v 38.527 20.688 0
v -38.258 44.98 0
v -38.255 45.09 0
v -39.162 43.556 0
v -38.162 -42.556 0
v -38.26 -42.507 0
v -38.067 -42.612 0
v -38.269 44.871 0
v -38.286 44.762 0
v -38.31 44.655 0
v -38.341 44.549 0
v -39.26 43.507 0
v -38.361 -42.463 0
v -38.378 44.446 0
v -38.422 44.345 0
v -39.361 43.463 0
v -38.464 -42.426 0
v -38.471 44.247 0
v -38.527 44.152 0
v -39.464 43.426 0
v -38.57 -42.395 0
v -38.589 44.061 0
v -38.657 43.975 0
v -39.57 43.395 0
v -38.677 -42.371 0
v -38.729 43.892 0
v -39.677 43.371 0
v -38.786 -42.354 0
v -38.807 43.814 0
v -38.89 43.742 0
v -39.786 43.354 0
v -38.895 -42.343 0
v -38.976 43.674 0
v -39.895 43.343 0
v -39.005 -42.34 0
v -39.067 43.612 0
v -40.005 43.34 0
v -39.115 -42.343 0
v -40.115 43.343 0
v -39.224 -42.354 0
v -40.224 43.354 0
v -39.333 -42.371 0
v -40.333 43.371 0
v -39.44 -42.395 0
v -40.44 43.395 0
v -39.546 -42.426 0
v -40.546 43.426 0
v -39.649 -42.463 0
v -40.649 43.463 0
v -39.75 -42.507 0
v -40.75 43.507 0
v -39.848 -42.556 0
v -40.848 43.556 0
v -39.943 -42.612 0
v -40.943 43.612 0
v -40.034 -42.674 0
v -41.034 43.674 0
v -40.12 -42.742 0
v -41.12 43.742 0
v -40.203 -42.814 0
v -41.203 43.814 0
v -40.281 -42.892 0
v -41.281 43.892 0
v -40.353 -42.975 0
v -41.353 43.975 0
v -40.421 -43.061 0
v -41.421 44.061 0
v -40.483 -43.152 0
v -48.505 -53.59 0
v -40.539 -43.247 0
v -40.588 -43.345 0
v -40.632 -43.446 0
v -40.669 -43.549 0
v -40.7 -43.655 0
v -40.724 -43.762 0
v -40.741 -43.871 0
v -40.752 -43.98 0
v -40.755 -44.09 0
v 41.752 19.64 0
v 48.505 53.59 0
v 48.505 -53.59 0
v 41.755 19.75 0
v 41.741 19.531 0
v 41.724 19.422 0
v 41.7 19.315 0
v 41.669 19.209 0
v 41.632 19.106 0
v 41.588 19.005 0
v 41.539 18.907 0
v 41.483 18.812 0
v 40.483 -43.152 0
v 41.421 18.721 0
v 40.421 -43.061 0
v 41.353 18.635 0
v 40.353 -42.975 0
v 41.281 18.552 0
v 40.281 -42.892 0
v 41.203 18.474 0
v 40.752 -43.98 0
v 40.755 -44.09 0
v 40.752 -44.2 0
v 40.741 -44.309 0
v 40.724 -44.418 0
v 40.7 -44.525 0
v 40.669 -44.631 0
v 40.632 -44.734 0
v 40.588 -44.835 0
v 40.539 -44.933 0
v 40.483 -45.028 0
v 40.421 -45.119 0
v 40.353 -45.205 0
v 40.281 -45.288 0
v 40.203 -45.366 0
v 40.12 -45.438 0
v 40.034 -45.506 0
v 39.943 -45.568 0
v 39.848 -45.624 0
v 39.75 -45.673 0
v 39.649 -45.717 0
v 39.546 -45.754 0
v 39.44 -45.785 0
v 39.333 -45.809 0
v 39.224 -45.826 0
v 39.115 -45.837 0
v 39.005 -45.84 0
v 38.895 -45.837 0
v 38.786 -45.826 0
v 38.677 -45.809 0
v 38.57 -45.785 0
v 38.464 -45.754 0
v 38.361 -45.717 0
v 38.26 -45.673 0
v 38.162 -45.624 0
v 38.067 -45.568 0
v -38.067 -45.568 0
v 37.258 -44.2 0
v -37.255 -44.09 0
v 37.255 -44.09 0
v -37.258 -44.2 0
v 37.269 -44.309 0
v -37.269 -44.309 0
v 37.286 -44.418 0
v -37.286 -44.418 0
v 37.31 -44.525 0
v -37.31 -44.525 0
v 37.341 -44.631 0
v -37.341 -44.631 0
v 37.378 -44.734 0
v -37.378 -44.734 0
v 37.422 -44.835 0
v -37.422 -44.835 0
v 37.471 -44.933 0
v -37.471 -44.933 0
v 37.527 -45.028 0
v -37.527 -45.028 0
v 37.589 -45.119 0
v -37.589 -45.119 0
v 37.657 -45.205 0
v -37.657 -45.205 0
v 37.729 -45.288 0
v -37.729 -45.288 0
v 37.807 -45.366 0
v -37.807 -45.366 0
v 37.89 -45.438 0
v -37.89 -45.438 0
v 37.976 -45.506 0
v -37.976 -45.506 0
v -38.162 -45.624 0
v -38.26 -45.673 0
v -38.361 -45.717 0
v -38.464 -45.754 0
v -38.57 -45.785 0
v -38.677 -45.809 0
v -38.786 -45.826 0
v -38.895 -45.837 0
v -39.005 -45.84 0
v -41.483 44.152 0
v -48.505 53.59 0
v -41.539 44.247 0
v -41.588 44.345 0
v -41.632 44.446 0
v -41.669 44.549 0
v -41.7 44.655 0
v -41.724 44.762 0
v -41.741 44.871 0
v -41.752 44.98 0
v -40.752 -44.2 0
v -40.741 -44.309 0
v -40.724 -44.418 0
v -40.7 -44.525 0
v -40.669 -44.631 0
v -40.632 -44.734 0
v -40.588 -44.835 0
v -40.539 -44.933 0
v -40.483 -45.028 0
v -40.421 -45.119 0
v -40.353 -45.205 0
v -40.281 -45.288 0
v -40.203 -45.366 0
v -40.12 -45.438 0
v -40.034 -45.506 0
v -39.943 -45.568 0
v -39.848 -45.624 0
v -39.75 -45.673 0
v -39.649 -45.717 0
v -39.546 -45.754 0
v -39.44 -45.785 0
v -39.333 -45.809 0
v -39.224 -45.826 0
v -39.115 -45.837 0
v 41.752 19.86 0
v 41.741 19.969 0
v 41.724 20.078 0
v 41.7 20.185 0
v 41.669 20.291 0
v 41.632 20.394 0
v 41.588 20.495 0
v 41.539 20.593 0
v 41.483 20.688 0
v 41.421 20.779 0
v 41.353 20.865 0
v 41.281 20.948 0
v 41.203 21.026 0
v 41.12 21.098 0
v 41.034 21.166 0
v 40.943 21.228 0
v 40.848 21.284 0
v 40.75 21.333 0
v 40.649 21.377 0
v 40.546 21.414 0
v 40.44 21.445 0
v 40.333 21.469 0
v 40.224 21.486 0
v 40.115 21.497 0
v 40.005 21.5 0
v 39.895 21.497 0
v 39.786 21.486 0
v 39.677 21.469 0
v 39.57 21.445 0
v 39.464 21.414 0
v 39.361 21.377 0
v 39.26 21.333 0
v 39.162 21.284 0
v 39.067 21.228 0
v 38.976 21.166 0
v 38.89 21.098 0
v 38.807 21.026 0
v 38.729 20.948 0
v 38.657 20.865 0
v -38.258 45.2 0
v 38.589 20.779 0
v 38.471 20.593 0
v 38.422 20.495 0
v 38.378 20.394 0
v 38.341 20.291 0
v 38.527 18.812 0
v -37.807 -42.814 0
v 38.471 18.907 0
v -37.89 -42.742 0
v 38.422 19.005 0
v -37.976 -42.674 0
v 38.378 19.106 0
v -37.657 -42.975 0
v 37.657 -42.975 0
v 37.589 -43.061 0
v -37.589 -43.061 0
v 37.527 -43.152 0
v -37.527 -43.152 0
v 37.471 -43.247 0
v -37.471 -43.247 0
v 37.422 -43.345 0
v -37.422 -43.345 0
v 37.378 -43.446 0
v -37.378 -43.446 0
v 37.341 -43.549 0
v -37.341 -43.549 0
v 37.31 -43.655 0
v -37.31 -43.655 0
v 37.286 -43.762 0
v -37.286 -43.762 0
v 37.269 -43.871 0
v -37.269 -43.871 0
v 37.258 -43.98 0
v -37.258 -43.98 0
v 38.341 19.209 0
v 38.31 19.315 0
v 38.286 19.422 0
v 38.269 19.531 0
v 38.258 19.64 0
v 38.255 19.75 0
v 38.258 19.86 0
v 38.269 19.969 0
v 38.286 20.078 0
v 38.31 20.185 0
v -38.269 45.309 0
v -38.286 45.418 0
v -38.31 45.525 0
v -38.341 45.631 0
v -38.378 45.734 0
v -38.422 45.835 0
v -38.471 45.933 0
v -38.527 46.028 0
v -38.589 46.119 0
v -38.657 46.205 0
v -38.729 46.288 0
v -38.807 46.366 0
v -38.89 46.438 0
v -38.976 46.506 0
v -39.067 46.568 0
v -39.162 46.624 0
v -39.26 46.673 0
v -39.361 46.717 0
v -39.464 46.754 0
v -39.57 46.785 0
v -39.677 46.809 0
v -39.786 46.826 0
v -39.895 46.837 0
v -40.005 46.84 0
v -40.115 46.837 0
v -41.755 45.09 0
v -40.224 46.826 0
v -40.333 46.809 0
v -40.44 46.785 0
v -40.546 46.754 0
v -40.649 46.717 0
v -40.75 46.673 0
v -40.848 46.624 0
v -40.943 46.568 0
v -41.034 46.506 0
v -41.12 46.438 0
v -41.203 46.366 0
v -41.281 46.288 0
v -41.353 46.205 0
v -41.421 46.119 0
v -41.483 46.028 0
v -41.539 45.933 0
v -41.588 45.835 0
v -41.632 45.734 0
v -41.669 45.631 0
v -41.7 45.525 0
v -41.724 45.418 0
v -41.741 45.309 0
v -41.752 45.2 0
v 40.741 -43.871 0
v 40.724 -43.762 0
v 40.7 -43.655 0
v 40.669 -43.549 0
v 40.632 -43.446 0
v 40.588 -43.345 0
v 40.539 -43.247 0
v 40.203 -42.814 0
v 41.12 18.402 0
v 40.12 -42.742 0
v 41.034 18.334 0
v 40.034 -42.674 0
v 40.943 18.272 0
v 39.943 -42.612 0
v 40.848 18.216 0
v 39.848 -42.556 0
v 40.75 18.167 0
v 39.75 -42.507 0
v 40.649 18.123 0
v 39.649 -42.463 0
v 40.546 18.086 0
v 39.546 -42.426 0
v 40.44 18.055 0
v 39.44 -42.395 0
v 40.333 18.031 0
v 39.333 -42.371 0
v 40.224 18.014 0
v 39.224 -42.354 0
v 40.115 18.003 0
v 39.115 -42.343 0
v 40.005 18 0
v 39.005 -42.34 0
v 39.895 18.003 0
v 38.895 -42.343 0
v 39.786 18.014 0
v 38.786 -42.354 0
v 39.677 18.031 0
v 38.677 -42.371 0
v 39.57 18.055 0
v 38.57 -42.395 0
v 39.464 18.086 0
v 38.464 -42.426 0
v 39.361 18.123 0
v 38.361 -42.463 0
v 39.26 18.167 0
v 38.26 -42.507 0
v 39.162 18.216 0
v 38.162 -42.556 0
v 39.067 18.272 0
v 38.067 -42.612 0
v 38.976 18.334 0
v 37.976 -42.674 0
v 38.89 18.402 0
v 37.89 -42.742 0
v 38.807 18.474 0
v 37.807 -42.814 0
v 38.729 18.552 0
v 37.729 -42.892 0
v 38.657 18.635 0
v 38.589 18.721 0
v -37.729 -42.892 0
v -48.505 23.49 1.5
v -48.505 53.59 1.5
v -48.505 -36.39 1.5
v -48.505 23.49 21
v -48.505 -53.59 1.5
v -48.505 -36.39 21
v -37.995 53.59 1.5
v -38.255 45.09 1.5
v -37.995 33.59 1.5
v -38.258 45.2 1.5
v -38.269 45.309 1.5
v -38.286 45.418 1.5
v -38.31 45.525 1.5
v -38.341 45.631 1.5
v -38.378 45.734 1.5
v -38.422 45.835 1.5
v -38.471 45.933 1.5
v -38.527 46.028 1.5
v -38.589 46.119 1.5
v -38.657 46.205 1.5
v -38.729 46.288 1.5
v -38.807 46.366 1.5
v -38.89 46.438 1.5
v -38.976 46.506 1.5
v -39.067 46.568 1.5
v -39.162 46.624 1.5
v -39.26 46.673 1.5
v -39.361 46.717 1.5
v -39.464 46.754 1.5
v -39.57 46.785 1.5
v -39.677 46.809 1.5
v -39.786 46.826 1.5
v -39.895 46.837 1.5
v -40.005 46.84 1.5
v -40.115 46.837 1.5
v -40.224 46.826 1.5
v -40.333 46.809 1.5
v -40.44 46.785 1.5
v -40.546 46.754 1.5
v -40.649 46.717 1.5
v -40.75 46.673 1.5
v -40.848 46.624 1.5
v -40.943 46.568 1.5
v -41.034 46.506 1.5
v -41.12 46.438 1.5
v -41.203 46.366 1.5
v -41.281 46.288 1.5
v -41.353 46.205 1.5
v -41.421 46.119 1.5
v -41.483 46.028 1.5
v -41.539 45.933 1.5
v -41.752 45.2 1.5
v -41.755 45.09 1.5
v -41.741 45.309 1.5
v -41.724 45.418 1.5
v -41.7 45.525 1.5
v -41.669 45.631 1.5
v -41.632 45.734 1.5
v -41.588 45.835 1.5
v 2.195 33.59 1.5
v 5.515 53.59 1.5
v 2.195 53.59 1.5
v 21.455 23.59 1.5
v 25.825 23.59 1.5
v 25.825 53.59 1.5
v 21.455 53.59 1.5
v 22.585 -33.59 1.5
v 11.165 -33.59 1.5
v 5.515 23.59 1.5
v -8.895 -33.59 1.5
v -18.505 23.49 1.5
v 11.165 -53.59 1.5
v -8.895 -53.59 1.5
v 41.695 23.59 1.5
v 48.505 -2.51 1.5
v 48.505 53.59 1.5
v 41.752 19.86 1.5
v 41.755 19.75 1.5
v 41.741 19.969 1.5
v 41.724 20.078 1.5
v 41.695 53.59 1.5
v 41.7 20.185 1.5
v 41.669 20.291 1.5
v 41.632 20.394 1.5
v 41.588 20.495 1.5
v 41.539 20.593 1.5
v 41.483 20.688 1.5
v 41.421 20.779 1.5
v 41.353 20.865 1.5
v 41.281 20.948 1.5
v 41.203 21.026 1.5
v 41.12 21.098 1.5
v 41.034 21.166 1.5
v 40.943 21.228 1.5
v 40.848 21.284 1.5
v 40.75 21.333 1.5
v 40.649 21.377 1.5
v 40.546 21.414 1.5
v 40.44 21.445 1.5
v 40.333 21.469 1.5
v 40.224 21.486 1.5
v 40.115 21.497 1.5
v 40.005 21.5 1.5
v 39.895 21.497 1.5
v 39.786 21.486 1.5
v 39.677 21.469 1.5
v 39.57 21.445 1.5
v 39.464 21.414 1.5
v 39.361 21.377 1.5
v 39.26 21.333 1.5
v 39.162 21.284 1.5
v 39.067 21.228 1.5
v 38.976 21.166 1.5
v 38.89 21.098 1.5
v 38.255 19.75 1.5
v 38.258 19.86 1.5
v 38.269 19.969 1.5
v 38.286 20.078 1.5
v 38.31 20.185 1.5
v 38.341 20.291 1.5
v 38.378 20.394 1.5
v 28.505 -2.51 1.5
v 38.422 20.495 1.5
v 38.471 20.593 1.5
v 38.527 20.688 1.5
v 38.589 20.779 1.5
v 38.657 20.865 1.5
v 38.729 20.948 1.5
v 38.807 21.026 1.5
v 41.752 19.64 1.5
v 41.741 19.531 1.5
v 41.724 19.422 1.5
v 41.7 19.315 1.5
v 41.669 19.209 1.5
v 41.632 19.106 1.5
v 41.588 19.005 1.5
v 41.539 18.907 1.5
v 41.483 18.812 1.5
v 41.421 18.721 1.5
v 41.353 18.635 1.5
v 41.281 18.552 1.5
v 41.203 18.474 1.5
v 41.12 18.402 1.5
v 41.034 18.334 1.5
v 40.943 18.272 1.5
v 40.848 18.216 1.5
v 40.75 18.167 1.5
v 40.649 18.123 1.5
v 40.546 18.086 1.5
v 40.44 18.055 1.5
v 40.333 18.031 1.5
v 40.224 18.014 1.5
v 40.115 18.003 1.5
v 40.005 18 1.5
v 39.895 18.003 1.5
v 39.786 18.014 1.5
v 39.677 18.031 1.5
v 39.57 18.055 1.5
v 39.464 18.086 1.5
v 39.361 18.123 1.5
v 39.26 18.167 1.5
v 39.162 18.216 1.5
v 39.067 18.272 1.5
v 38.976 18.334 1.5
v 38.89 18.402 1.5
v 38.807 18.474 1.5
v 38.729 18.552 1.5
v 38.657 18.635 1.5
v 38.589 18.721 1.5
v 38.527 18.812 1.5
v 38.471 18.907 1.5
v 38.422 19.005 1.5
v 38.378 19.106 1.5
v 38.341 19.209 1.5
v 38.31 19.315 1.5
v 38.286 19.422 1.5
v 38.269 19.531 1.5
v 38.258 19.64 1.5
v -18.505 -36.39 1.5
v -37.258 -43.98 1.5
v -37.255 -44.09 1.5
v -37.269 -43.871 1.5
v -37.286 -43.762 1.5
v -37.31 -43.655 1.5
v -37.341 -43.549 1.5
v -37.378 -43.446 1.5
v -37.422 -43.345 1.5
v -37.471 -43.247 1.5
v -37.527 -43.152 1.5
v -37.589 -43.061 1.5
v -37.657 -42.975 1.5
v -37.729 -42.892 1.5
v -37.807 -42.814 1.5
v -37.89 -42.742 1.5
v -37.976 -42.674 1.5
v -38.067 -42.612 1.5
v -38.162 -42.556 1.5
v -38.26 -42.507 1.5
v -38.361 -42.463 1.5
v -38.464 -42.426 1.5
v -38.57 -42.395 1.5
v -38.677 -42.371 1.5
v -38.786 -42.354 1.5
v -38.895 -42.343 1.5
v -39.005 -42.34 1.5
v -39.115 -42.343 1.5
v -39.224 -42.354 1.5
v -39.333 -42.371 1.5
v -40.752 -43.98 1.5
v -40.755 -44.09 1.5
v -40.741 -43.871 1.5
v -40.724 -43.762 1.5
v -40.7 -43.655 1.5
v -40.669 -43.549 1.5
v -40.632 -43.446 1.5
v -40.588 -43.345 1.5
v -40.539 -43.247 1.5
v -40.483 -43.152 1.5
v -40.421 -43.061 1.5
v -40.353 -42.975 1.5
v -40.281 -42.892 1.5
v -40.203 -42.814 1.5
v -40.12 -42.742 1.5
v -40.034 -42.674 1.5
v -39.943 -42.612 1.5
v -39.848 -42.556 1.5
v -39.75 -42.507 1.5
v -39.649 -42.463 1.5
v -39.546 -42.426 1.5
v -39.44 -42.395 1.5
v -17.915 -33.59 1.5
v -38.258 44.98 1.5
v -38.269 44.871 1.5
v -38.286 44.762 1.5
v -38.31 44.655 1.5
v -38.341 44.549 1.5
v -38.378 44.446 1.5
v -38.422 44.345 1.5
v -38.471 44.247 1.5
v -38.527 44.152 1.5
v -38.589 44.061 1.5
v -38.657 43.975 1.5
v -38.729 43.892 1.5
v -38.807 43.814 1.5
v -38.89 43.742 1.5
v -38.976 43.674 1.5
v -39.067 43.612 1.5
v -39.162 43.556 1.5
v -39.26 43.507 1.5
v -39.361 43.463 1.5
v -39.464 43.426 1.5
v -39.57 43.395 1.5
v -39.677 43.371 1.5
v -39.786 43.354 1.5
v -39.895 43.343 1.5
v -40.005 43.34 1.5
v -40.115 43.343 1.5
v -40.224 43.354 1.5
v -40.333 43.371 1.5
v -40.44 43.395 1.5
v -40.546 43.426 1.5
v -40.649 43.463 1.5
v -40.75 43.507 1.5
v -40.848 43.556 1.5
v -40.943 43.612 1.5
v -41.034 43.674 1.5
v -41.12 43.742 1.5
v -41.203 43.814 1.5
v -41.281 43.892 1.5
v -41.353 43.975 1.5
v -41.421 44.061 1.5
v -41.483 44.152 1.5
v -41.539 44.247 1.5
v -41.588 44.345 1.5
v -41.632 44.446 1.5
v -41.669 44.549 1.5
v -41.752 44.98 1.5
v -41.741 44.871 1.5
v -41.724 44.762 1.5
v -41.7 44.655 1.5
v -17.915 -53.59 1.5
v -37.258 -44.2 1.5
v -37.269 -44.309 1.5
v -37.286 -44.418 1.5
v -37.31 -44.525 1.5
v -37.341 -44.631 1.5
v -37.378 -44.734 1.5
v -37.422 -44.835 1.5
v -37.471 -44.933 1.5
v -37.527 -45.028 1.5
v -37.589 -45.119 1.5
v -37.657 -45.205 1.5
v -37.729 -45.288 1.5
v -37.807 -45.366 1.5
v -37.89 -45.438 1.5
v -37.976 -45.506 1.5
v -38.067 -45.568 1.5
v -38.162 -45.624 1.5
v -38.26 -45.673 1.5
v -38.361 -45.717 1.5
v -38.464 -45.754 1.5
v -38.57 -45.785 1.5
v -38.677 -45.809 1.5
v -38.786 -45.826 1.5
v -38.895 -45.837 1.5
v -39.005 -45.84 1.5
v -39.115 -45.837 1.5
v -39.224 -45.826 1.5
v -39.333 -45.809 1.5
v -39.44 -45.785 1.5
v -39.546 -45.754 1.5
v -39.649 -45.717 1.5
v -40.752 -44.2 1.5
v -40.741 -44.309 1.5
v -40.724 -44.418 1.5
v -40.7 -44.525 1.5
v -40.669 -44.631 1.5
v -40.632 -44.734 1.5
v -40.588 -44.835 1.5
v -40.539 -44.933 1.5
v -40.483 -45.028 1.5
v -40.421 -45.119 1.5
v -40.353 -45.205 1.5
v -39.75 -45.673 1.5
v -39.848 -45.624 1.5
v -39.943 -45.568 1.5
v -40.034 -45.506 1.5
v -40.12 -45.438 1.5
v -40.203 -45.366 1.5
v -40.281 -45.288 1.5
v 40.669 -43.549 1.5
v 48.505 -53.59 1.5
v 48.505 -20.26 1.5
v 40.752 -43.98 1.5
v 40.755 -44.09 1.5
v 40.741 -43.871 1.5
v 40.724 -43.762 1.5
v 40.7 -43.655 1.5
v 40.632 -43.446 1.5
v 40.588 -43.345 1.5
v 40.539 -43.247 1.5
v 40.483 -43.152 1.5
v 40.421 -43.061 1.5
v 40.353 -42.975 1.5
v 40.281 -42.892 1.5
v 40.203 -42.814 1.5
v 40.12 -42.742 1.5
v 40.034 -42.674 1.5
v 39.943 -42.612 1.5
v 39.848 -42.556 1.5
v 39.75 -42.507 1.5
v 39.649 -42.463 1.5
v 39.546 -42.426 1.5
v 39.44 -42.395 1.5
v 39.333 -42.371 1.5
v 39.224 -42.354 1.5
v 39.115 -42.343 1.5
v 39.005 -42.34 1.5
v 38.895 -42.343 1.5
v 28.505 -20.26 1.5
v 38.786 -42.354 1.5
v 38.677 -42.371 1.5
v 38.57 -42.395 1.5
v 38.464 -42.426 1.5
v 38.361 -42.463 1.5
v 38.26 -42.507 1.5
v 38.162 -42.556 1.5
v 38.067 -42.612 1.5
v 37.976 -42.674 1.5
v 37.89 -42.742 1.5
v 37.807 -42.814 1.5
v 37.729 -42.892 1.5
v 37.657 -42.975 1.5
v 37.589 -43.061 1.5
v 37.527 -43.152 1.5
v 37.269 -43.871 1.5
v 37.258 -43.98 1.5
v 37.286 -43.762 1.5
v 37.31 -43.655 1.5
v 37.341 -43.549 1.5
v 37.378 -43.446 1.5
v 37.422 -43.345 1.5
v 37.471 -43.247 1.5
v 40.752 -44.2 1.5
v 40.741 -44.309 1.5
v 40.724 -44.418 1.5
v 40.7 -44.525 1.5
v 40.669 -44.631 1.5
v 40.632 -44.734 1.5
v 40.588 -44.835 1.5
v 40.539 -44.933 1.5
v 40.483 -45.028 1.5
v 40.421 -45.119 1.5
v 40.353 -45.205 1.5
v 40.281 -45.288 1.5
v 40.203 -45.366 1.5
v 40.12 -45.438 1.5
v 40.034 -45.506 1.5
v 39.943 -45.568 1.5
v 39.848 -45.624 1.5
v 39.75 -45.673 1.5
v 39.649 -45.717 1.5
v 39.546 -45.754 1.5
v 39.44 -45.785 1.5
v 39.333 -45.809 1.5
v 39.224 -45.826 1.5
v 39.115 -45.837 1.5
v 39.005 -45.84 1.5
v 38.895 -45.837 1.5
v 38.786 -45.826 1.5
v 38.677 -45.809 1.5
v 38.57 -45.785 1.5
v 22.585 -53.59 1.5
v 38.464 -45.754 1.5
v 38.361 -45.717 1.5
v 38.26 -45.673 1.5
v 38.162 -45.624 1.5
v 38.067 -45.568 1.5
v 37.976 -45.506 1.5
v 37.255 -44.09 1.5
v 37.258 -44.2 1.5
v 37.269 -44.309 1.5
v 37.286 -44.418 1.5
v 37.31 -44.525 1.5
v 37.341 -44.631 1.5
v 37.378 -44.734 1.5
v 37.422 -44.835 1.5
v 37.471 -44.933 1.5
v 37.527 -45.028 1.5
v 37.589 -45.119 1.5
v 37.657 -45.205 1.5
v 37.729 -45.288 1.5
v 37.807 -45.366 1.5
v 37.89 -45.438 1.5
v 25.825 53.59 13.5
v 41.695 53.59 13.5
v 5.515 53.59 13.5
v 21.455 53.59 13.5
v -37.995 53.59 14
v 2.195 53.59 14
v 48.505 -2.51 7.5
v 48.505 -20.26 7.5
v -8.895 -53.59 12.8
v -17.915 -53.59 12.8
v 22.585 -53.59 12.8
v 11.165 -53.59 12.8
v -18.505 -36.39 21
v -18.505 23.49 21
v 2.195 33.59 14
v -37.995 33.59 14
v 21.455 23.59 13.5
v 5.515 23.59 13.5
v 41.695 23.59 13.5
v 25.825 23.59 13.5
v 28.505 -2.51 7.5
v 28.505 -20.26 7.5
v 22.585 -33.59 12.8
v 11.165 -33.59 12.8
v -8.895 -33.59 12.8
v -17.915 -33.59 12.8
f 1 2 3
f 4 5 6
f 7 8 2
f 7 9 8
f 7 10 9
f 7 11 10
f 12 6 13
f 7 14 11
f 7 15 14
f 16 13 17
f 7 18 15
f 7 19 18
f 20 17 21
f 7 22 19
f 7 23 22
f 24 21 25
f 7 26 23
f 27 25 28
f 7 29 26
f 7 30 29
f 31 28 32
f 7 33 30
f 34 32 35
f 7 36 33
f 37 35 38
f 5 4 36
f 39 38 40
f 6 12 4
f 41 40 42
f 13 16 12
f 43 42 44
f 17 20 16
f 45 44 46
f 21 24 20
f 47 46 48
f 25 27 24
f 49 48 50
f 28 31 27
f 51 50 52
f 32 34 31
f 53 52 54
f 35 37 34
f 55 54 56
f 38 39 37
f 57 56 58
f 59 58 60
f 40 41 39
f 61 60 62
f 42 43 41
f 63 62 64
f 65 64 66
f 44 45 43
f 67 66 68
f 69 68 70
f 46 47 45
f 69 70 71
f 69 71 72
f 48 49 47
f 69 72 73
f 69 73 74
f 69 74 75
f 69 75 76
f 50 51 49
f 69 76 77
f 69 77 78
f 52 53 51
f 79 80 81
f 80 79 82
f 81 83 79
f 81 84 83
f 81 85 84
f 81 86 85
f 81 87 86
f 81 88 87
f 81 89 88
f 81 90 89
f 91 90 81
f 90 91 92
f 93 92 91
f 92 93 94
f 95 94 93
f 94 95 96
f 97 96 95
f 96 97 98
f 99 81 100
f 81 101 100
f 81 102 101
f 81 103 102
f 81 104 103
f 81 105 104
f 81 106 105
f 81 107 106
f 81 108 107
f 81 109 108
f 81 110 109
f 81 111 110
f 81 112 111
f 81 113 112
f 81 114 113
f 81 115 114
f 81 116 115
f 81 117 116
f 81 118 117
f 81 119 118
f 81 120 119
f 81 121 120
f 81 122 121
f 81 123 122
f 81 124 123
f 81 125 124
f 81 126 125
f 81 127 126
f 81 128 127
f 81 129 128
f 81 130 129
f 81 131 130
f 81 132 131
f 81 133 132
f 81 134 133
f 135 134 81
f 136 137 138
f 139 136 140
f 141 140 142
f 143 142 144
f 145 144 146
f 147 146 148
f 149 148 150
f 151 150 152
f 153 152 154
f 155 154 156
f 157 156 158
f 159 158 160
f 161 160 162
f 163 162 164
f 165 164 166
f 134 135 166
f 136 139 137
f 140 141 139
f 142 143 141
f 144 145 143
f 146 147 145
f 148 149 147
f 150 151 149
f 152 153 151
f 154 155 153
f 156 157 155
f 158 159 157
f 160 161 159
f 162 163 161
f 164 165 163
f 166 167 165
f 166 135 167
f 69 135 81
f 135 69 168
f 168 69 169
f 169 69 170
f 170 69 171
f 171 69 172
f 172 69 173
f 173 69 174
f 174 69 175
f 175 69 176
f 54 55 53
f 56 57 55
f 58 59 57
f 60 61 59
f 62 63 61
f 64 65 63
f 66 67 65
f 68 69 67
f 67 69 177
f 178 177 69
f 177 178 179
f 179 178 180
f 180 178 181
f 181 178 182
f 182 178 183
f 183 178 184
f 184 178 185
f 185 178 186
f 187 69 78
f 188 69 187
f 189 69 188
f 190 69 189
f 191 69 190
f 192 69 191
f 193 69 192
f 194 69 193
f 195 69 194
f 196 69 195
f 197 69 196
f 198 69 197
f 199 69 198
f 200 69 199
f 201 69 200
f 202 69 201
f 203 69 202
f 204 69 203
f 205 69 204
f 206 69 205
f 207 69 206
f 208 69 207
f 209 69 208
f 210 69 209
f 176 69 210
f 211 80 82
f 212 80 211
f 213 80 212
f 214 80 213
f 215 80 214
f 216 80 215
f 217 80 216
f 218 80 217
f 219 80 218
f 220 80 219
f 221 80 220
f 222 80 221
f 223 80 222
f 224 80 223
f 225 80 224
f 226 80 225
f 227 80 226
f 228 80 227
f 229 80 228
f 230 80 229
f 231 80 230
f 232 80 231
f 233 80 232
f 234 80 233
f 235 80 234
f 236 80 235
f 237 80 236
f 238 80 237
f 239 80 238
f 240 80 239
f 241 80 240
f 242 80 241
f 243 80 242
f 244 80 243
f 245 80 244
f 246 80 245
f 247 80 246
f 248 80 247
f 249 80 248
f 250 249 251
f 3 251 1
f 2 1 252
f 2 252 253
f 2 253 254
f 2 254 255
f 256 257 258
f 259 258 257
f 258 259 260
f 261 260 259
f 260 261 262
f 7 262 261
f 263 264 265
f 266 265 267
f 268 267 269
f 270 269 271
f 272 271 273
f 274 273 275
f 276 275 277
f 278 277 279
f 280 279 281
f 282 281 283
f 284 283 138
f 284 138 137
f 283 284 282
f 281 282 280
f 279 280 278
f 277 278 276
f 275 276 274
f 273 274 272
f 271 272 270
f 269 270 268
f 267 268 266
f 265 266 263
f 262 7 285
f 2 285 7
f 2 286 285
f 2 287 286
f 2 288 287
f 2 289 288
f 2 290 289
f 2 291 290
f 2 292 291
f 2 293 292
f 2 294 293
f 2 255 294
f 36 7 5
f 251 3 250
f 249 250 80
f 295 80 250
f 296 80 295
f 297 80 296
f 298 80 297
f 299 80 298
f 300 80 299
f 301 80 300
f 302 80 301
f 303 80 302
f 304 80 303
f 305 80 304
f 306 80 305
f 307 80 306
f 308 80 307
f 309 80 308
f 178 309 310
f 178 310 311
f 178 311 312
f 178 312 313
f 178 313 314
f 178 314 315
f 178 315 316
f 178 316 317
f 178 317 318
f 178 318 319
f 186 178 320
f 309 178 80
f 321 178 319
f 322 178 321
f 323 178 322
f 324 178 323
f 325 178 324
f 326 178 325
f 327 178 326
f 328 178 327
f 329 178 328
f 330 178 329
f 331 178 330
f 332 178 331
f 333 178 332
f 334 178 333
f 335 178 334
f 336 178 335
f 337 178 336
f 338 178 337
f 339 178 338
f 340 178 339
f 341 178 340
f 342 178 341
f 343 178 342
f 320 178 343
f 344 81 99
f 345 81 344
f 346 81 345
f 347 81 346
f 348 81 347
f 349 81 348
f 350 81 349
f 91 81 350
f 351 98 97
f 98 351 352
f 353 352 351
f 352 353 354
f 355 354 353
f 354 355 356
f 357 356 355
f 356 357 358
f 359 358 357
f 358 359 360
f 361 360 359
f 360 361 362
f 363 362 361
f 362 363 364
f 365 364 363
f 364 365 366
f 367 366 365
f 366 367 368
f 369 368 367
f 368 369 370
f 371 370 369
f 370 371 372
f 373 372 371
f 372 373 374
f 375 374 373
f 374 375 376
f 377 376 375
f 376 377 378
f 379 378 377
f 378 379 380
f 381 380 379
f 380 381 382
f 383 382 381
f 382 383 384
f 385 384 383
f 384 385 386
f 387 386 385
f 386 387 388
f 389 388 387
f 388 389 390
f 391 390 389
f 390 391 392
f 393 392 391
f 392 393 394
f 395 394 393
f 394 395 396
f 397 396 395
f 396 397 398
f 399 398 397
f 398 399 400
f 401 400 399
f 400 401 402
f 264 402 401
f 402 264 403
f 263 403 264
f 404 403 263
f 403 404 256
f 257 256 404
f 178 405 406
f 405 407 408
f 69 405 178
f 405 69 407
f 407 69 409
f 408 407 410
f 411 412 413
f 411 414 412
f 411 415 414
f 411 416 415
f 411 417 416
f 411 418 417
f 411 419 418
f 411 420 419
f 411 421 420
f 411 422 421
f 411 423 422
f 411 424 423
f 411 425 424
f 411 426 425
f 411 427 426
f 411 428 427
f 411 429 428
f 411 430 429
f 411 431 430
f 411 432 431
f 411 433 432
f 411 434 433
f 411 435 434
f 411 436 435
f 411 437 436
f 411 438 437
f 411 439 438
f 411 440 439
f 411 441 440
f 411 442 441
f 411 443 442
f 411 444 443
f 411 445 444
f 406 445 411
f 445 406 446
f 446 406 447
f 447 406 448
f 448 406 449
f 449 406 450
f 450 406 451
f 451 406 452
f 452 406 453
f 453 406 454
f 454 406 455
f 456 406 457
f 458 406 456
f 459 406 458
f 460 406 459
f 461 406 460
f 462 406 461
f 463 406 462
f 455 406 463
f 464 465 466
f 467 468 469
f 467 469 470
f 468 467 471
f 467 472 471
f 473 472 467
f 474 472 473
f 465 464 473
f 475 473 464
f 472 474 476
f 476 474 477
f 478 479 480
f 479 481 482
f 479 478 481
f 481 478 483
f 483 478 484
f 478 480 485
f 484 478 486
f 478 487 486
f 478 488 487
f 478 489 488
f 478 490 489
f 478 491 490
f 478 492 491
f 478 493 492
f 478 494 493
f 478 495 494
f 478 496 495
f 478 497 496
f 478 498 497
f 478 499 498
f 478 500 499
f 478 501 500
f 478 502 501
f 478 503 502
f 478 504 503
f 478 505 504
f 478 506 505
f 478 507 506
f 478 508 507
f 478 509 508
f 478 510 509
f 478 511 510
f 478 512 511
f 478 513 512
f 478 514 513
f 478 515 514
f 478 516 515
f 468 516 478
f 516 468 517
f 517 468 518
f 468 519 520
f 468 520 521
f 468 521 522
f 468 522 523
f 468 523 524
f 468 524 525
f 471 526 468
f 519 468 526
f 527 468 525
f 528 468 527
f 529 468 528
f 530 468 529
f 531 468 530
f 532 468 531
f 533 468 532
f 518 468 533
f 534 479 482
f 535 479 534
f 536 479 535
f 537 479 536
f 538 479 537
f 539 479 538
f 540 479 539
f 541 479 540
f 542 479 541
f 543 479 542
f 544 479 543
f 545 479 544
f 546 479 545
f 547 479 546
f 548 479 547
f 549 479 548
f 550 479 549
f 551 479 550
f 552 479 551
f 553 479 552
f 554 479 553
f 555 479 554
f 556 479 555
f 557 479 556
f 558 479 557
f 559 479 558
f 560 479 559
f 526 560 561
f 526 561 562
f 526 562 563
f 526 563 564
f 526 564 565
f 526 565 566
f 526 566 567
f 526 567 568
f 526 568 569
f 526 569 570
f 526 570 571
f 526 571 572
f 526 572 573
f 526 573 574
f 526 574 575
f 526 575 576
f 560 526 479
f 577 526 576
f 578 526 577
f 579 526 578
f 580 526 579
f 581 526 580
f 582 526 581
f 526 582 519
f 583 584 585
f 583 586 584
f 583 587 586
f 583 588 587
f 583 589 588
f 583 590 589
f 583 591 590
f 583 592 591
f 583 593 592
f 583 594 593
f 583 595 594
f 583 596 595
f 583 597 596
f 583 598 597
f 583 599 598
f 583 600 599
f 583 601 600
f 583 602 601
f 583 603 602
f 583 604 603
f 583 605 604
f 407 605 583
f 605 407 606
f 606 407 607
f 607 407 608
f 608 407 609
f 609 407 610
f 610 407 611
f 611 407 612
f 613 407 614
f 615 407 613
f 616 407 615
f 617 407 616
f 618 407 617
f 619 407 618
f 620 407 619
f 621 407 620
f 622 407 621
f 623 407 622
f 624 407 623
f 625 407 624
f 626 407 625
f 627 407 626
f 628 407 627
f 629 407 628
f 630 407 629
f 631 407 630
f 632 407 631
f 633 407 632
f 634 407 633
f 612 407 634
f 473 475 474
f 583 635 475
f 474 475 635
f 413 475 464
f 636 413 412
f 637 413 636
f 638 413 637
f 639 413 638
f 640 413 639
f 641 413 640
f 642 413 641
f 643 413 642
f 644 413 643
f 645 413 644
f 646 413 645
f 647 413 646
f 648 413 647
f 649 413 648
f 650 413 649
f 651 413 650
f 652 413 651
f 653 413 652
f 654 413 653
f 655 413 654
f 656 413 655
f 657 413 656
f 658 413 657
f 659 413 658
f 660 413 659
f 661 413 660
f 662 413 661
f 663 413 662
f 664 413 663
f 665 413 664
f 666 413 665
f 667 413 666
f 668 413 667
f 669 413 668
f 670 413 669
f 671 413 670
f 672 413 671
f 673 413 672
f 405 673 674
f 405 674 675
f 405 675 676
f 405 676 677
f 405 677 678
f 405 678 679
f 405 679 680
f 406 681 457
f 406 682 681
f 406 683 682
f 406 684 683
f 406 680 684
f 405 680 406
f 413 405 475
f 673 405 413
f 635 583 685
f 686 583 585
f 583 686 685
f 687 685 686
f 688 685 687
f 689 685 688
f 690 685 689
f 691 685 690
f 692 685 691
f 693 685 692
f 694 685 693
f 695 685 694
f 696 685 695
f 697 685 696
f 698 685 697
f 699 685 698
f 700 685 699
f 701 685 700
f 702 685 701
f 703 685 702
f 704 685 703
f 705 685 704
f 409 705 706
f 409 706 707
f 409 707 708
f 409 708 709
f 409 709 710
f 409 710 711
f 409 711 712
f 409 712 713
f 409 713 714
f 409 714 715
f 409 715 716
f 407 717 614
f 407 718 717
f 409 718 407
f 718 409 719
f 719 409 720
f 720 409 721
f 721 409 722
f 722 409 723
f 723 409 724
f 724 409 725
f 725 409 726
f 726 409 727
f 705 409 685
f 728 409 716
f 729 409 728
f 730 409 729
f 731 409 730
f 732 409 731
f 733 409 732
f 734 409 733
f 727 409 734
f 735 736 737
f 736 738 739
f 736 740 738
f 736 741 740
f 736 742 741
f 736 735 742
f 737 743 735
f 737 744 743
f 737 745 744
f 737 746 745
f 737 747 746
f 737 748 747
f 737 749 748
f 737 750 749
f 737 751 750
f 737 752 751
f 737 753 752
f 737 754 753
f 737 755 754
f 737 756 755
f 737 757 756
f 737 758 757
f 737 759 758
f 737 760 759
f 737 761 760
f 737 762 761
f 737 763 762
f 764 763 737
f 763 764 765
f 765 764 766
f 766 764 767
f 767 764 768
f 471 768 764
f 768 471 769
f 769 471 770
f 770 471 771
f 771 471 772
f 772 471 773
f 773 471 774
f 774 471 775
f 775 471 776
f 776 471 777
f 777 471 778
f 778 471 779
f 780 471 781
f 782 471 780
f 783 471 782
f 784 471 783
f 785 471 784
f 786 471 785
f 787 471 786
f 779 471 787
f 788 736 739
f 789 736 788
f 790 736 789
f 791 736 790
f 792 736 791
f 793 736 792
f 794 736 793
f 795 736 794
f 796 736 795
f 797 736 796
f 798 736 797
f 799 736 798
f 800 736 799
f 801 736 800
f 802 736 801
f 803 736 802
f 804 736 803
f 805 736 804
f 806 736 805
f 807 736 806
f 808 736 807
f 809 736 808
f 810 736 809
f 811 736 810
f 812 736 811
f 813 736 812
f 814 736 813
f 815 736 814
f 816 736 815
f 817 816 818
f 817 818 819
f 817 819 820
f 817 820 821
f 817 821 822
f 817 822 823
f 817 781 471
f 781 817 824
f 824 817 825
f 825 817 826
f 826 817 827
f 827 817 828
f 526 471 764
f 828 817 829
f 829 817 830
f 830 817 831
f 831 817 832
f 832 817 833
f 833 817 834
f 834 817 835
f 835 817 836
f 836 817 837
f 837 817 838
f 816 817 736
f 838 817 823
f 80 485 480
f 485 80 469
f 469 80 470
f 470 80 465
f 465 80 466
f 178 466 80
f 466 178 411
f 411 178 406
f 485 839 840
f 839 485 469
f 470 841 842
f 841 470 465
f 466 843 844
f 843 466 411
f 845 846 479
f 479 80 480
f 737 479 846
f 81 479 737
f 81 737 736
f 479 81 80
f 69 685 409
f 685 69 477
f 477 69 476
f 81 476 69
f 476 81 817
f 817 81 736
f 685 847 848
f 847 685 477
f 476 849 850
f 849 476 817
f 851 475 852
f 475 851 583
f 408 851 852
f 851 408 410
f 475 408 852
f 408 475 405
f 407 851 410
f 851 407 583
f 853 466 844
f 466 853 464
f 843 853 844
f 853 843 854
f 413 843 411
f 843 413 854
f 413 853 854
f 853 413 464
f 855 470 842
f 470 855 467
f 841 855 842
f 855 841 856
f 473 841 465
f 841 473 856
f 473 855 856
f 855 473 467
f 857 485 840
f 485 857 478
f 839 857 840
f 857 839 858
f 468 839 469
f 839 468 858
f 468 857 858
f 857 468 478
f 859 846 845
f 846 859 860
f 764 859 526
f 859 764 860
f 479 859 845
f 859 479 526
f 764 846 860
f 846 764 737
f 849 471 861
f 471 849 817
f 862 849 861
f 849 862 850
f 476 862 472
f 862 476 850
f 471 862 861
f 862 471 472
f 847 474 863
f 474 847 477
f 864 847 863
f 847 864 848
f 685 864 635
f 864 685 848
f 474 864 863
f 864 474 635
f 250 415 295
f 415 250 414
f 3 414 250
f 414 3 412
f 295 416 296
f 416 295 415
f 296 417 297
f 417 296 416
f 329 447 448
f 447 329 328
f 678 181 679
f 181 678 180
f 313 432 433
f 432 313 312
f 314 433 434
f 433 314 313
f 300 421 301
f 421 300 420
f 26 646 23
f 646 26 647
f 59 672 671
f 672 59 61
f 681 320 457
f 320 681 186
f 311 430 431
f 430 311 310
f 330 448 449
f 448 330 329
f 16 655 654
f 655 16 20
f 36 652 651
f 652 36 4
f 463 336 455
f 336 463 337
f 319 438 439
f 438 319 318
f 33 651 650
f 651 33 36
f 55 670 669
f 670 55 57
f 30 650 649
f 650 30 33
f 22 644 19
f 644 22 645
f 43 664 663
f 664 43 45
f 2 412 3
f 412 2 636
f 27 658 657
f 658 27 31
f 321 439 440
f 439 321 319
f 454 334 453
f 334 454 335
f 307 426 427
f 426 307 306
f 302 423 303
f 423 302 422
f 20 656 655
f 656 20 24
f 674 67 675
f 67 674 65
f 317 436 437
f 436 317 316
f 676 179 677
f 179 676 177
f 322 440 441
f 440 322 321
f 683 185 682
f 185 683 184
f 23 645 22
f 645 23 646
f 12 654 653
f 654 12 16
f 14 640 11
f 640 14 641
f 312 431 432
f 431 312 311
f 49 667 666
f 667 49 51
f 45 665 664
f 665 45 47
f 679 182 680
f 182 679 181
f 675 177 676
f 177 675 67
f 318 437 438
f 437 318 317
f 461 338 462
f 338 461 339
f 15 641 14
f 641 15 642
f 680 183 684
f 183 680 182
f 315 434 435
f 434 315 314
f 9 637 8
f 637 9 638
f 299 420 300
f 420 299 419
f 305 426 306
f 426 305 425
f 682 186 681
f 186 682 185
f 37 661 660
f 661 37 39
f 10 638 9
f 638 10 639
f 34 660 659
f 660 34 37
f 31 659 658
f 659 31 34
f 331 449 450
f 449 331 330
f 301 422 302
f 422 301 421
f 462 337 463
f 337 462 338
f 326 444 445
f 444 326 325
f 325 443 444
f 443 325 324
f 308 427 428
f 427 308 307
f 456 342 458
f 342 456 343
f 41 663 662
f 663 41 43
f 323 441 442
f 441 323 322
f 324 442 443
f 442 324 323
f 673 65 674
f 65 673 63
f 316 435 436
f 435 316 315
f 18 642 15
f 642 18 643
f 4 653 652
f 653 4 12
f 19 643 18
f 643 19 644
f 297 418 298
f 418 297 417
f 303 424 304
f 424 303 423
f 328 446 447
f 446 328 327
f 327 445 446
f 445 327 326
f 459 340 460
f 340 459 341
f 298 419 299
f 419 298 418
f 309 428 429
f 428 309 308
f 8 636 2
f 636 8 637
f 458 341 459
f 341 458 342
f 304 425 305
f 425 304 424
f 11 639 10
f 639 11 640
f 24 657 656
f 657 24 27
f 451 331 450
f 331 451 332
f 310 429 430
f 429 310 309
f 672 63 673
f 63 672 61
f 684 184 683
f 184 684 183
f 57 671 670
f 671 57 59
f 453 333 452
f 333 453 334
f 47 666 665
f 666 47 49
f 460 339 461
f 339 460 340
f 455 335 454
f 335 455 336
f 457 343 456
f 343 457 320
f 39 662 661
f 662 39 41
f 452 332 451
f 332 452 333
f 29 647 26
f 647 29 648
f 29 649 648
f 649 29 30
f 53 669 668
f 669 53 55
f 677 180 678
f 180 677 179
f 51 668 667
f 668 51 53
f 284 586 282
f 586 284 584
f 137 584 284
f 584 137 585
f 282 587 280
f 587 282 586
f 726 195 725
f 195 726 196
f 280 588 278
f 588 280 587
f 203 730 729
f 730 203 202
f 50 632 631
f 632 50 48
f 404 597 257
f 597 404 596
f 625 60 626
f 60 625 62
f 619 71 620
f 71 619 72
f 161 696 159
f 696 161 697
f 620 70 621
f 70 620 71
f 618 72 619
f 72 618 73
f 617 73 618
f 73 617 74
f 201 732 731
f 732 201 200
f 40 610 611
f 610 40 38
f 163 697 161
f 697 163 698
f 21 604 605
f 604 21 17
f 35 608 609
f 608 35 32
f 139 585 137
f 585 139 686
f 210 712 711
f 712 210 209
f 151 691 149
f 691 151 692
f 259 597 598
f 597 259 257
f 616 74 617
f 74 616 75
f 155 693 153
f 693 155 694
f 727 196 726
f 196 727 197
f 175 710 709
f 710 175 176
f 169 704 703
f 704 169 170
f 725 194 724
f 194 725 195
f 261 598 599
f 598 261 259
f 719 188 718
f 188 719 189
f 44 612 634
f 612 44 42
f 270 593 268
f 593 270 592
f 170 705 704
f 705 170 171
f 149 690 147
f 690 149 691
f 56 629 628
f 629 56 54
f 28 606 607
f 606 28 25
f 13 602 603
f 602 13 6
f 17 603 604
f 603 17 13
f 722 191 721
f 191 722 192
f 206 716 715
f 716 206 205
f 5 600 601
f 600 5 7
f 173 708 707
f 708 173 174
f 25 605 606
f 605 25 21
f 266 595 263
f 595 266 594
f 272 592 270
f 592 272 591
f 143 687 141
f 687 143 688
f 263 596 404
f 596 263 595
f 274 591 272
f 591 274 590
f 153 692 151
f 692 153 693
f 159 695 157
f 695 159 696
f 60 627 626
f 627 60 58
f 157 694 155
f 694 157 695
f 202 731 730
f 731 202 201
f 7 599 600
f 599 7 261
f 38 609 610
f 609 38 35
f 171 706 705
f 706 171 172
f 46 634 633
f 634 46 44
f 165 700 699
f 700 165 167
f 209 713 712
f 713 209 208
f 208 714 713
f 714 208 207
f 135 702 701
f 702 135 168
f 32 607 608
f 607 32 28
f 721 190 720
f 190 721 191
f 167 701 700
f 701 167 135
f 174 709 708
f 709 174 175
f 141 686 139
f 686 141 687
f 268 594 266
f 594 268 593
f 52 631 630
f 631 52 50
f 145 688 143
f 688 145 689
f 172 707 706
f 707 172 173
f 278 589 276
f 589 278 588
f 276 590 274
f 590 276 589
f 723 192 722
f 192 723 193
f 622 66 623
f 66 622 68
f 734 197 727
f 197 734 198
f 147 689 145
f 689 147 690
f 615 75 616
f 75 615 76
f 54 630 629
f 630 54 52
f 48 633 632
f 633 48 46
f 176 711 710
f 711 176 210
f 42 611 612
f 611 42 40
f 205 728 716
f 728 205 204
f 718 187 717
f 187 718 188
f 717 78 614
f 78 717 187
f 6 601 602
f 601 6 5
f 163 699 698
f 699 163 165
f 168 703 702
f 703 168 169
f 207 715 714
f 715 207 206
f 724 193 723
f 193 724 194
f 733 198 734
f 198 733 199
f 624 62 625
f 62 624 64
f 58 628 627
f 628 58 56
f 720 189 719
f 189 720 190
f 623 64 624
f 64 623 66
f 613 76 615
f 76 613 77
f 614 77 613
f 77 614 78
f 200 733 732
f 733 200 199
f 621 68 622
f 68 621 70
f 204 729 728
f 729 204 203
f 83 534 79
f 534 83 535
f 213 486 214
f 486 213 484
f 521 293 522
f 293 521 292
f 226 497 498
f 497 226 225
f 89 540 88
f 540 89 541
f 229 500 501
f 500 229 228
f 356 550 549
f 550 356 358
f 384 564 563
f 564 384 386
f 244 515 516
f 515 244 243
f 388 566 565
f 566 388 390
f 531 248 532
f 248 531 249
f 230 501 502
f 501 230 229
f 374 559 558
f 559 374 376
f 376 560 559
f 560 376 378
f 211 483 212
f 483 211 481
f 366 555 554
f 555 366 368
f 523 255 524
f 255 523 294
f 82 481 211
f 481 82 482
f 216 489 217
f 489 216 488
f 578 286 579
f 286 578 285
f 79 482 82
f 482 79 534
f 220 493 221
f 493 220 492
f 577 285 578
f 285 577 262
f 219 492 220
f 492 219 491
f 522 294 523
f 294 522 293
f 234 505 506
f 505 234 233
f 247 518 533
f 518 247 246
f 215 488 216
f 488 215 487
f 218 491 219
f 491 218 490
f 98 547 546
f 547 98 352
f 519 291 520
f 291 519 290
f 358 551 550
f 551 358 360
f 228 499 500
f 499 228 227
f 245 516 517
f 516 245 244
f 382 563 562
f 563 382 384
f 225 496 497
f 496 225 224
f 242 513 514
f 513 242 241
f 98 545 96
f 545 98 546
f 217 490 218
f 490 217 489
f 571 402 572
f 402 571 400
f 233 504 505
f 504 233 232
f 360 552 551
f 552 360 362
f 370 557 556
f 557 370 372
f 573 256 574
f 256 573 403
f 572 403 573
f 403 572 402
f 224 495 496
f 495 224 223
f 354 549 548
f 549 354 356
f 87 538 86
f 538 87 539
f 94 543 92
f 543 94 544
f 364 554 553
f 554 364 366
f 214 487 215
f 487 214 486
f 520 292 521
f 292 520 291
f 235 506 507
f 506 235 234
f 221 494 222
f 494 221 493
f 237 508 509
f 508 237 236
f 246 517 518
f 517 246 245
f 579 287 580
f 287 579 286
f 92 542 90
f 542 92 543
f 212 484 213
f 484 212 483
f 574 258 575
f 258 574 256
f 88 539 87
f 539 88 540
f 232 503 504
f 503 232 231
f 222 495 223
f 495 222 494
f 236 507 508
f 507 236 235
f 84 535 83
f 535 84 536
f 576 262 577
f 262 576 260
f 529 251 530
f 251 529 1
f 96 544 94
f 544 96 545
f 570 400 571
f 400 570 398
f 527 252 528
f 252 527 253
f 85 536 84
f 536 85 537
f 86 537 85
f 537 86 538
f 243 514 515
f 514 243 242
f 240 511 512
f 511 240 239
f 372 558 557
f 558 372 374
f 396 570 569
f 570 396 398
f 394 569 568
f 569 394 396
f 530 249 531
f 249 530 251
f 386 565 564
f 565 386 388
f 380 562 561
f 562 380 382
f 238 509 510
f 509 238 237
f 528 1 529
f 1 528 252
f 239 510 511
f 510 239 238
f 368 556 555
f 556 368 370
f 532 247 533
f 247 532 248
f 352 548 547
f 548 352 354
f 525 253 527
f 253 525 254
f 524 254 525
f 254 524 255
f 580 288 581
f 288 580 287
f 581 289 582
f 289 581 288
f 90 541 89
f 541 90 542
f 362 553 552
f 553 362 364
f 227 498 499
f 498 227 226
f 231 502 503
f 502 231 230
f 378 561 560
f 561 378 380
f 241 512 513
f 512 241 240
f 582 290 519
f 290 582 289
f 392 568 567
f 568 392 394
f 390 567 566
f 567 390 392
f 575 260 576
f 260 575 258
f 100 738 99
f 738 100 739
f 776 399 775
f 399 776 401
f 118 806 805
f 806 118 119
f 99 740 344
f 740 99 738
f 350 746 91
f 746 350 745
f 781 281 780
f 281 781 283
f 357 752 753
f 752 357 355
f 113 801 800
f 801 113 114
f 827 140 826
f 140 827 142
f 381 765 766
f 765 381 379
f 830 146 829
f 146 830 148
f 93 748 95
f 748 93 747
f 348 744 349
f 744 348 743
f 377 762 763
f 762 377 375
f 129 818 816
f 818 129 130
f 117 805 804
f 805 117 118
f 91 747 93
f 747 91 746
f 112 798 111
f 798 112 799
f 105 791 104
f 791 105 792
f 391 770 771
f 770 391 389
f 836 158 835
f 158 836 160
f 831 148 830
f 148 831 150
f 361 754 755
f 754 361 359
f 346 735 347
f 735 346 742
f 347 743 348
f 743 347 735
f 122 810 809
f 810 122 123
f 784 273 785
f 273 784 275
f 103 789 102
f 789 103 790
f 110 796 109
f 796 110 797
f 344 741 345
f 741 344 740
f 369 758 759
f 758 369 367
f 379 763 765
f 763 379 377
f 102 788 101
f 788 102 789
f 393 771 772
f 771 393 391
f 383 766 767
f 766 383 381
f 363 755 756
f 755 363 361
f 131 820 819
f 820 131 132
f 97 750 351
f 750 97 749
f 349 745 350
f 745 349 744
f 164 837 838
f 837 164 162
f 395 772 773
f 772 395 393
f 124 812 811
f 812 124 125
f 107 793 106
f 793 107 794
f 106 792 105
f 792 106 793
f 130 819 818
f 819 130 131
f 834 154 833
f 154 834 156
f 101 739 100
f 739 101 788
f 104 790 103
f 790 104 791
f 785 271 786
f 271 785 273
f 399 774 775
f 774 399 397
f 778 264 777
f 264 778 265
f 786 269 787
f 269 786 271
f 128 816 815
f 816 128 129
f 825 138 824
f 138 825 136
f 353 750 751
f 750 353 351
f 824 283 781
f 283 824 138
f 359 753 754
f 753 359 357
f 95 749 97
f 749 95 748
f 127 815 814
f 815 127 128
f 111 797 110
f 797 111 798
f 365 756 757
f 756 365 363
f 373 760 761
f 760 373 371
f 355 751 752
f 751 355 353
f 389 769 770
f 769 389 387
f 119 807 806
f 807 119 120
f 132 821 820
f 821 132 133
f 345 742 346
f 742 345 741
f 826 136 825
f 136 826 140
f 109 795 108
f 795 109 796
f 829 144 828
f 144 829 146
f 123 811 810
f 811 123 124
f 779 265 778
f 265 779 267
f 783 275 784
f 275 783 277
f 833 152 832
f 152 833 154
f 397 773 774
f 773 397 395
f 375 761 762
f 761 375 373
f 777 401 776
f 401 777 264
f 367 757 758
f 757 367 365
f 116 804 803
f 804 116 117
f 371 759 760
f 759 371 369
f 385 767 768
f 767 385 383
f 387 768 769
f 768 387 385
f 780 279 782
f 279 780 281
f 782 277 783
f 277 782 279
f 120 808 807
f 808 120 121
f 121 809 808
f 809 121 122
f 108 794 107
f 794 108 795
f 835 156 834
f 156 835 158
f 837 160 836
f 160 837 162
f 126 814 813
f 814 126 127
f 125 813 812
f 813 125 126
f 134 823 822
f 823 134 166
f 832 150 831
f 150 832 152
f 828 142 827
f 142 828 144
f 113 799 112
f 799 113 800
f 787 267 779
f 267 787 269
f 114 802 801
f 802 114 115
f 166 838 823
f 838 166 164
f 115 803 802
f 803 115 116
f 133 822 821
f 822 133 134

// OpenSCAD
module placa(taladro=10) {
lonX=87.01;
lonY=97.18;
altoPlaca=1.5;



difference(){

union(){
linear_extrude(height=altoPlaca)
square([lonX+taladro,lonY+taladro],center=true);


//####CONECTOR TRIPLE MIDI#####

//posicionamiento
translate([0,-6.45,0])
//centramiento
translate([-((lonX/2)-(20/2)),0,(19.5/2)+altoPlaca])
cube([20+taladro,59.88,19.5],center=true);

//#####CALCULOS MIDI ####
//espacio centrado MIDI
//echo((lonY-59.88)/2);

//cAlculo posicionamiento
//echo(18.65-12.20);

//####CONECTOR CENTROMIX ####


ajusteC=2*(7+1);
//posicionamiento
translate([-17.9,0,0])

//centramiento
translate([0,(lonY/2)-(10/2),altoPlaca+(12/2)])
cube([24.19+ajusteC,10+taladro,12+1],center=true);

//####CALCULOS CENTROMIX####

//espacio centrado
//echo((lonX-24.19)/2);

//cAlculo posicionamiento
//echo(31.41-13.51);

//#### CONECTOR TELEFONICO1 ####
//posicionamiento
translate([13.485,0,0])

//centramiento
translate([0,lonY/2-(20/2),(12/2)+altoPlaca])

cube([15.94,20+taladro,12],center=true);


//####CALCULOS TELEFONICO 1 ####
//espacio centrado
//echo((lonX-15.94)/2);

//cAlculo posicionamiento
//echo(35.535-(11.32+24.19+13.51));

//#### CONECTOR TELEFONICO 2

//posicionamiento
translate([33.76,0,0])

//centramiento
translate([0,lonY/2-(20/2),(12/2)+altoPlaca])

cube([15.87,20+taladro,12],center=true);

//####CALCULOS TELEFONICO 2 ####

//espacio centrado
//echo((lonX-15.87)/2);

//cAlculo posicionamiento
//echo(35.57-(11.32+24.19+13.51+15.94+4.37));

//#### CONECTOR PIN ANG 90 #####

//posicionamiento
translate([0,-11.385,0])

//centramiento
translate([(lonX/2)-(10/2),0,altoPlaca+(6/2)])

cube([10+taladro,17.75,6],center=true);

//####CALCULOS PIN ANG 90####

//espacio centrado
//echo((lonY-17.75)/2);

//cAlculo posicionamiento
//echo(39.715-51.1);

//comprobaciOn
//echo(11.385+39.715);

//#### CONECTOR USB A ####

//posicionamiento
translate([16.875,0,0])

//centramiento
translate([0,-((lonY/2)-(10/2)),altoPlaca+(11.3/2)])

cube([11.42,10+taladro,11.3],center=true);

//####CALCULOS USB A ####

//espacio centrado
//echo((lonX-11.42)/2);

//cAlculo posicionamiento
//echo(37.795-20.92);

//#### JACK PODER ####

//posicionamiento
translate([-13.405,0,0])

//centramiento
translate([0,-((lonY/2)-(10/2)),altoPlaca+(11.3/2)])

cube([9.02,10+taladro,11.3],center=true);

//#### CALCULOS JACK PODER #####

//espacio centrado
//echo((lonX-9.02)/2);

//cAlculo posicionamiento
echo(38.995-(11.3+20.92+20.18));

}//fin union

//#### TORNILLOS ####


//#### superior izquierdo #####

//centramiento
translate([-lonX/2+(3.5),lonY/2-(3.5),0])
cylinder(r=(3.5)/2,h=3,$fn=100,center=true);

//#### inferior izquierdo #####

//ajuste
translate([1,1,0])

//centramiento
translate([-lonX/2+(3.5),-lonY/2+(3.5),0])
cylinder(r=(3.5)/2,h=3,$fn=100,center=true);

//#### superior derecho #####

//centramiento
translate([lonX/2-(3.5),lonY/2-28.84,0])
cylinder(r=(3.5)/2,h=3,$fn=100,center=true);

//#### inferior derecho #####

//ajuste
translate([-1,1,0])

//centramiento
translate([lonX/2-(3.5),-lonY/2+(3.5),0])
cylinder(r=(3.5)/2,h=3,$fn=100,center=true);
}//fin difference

}//fin module

placa();
